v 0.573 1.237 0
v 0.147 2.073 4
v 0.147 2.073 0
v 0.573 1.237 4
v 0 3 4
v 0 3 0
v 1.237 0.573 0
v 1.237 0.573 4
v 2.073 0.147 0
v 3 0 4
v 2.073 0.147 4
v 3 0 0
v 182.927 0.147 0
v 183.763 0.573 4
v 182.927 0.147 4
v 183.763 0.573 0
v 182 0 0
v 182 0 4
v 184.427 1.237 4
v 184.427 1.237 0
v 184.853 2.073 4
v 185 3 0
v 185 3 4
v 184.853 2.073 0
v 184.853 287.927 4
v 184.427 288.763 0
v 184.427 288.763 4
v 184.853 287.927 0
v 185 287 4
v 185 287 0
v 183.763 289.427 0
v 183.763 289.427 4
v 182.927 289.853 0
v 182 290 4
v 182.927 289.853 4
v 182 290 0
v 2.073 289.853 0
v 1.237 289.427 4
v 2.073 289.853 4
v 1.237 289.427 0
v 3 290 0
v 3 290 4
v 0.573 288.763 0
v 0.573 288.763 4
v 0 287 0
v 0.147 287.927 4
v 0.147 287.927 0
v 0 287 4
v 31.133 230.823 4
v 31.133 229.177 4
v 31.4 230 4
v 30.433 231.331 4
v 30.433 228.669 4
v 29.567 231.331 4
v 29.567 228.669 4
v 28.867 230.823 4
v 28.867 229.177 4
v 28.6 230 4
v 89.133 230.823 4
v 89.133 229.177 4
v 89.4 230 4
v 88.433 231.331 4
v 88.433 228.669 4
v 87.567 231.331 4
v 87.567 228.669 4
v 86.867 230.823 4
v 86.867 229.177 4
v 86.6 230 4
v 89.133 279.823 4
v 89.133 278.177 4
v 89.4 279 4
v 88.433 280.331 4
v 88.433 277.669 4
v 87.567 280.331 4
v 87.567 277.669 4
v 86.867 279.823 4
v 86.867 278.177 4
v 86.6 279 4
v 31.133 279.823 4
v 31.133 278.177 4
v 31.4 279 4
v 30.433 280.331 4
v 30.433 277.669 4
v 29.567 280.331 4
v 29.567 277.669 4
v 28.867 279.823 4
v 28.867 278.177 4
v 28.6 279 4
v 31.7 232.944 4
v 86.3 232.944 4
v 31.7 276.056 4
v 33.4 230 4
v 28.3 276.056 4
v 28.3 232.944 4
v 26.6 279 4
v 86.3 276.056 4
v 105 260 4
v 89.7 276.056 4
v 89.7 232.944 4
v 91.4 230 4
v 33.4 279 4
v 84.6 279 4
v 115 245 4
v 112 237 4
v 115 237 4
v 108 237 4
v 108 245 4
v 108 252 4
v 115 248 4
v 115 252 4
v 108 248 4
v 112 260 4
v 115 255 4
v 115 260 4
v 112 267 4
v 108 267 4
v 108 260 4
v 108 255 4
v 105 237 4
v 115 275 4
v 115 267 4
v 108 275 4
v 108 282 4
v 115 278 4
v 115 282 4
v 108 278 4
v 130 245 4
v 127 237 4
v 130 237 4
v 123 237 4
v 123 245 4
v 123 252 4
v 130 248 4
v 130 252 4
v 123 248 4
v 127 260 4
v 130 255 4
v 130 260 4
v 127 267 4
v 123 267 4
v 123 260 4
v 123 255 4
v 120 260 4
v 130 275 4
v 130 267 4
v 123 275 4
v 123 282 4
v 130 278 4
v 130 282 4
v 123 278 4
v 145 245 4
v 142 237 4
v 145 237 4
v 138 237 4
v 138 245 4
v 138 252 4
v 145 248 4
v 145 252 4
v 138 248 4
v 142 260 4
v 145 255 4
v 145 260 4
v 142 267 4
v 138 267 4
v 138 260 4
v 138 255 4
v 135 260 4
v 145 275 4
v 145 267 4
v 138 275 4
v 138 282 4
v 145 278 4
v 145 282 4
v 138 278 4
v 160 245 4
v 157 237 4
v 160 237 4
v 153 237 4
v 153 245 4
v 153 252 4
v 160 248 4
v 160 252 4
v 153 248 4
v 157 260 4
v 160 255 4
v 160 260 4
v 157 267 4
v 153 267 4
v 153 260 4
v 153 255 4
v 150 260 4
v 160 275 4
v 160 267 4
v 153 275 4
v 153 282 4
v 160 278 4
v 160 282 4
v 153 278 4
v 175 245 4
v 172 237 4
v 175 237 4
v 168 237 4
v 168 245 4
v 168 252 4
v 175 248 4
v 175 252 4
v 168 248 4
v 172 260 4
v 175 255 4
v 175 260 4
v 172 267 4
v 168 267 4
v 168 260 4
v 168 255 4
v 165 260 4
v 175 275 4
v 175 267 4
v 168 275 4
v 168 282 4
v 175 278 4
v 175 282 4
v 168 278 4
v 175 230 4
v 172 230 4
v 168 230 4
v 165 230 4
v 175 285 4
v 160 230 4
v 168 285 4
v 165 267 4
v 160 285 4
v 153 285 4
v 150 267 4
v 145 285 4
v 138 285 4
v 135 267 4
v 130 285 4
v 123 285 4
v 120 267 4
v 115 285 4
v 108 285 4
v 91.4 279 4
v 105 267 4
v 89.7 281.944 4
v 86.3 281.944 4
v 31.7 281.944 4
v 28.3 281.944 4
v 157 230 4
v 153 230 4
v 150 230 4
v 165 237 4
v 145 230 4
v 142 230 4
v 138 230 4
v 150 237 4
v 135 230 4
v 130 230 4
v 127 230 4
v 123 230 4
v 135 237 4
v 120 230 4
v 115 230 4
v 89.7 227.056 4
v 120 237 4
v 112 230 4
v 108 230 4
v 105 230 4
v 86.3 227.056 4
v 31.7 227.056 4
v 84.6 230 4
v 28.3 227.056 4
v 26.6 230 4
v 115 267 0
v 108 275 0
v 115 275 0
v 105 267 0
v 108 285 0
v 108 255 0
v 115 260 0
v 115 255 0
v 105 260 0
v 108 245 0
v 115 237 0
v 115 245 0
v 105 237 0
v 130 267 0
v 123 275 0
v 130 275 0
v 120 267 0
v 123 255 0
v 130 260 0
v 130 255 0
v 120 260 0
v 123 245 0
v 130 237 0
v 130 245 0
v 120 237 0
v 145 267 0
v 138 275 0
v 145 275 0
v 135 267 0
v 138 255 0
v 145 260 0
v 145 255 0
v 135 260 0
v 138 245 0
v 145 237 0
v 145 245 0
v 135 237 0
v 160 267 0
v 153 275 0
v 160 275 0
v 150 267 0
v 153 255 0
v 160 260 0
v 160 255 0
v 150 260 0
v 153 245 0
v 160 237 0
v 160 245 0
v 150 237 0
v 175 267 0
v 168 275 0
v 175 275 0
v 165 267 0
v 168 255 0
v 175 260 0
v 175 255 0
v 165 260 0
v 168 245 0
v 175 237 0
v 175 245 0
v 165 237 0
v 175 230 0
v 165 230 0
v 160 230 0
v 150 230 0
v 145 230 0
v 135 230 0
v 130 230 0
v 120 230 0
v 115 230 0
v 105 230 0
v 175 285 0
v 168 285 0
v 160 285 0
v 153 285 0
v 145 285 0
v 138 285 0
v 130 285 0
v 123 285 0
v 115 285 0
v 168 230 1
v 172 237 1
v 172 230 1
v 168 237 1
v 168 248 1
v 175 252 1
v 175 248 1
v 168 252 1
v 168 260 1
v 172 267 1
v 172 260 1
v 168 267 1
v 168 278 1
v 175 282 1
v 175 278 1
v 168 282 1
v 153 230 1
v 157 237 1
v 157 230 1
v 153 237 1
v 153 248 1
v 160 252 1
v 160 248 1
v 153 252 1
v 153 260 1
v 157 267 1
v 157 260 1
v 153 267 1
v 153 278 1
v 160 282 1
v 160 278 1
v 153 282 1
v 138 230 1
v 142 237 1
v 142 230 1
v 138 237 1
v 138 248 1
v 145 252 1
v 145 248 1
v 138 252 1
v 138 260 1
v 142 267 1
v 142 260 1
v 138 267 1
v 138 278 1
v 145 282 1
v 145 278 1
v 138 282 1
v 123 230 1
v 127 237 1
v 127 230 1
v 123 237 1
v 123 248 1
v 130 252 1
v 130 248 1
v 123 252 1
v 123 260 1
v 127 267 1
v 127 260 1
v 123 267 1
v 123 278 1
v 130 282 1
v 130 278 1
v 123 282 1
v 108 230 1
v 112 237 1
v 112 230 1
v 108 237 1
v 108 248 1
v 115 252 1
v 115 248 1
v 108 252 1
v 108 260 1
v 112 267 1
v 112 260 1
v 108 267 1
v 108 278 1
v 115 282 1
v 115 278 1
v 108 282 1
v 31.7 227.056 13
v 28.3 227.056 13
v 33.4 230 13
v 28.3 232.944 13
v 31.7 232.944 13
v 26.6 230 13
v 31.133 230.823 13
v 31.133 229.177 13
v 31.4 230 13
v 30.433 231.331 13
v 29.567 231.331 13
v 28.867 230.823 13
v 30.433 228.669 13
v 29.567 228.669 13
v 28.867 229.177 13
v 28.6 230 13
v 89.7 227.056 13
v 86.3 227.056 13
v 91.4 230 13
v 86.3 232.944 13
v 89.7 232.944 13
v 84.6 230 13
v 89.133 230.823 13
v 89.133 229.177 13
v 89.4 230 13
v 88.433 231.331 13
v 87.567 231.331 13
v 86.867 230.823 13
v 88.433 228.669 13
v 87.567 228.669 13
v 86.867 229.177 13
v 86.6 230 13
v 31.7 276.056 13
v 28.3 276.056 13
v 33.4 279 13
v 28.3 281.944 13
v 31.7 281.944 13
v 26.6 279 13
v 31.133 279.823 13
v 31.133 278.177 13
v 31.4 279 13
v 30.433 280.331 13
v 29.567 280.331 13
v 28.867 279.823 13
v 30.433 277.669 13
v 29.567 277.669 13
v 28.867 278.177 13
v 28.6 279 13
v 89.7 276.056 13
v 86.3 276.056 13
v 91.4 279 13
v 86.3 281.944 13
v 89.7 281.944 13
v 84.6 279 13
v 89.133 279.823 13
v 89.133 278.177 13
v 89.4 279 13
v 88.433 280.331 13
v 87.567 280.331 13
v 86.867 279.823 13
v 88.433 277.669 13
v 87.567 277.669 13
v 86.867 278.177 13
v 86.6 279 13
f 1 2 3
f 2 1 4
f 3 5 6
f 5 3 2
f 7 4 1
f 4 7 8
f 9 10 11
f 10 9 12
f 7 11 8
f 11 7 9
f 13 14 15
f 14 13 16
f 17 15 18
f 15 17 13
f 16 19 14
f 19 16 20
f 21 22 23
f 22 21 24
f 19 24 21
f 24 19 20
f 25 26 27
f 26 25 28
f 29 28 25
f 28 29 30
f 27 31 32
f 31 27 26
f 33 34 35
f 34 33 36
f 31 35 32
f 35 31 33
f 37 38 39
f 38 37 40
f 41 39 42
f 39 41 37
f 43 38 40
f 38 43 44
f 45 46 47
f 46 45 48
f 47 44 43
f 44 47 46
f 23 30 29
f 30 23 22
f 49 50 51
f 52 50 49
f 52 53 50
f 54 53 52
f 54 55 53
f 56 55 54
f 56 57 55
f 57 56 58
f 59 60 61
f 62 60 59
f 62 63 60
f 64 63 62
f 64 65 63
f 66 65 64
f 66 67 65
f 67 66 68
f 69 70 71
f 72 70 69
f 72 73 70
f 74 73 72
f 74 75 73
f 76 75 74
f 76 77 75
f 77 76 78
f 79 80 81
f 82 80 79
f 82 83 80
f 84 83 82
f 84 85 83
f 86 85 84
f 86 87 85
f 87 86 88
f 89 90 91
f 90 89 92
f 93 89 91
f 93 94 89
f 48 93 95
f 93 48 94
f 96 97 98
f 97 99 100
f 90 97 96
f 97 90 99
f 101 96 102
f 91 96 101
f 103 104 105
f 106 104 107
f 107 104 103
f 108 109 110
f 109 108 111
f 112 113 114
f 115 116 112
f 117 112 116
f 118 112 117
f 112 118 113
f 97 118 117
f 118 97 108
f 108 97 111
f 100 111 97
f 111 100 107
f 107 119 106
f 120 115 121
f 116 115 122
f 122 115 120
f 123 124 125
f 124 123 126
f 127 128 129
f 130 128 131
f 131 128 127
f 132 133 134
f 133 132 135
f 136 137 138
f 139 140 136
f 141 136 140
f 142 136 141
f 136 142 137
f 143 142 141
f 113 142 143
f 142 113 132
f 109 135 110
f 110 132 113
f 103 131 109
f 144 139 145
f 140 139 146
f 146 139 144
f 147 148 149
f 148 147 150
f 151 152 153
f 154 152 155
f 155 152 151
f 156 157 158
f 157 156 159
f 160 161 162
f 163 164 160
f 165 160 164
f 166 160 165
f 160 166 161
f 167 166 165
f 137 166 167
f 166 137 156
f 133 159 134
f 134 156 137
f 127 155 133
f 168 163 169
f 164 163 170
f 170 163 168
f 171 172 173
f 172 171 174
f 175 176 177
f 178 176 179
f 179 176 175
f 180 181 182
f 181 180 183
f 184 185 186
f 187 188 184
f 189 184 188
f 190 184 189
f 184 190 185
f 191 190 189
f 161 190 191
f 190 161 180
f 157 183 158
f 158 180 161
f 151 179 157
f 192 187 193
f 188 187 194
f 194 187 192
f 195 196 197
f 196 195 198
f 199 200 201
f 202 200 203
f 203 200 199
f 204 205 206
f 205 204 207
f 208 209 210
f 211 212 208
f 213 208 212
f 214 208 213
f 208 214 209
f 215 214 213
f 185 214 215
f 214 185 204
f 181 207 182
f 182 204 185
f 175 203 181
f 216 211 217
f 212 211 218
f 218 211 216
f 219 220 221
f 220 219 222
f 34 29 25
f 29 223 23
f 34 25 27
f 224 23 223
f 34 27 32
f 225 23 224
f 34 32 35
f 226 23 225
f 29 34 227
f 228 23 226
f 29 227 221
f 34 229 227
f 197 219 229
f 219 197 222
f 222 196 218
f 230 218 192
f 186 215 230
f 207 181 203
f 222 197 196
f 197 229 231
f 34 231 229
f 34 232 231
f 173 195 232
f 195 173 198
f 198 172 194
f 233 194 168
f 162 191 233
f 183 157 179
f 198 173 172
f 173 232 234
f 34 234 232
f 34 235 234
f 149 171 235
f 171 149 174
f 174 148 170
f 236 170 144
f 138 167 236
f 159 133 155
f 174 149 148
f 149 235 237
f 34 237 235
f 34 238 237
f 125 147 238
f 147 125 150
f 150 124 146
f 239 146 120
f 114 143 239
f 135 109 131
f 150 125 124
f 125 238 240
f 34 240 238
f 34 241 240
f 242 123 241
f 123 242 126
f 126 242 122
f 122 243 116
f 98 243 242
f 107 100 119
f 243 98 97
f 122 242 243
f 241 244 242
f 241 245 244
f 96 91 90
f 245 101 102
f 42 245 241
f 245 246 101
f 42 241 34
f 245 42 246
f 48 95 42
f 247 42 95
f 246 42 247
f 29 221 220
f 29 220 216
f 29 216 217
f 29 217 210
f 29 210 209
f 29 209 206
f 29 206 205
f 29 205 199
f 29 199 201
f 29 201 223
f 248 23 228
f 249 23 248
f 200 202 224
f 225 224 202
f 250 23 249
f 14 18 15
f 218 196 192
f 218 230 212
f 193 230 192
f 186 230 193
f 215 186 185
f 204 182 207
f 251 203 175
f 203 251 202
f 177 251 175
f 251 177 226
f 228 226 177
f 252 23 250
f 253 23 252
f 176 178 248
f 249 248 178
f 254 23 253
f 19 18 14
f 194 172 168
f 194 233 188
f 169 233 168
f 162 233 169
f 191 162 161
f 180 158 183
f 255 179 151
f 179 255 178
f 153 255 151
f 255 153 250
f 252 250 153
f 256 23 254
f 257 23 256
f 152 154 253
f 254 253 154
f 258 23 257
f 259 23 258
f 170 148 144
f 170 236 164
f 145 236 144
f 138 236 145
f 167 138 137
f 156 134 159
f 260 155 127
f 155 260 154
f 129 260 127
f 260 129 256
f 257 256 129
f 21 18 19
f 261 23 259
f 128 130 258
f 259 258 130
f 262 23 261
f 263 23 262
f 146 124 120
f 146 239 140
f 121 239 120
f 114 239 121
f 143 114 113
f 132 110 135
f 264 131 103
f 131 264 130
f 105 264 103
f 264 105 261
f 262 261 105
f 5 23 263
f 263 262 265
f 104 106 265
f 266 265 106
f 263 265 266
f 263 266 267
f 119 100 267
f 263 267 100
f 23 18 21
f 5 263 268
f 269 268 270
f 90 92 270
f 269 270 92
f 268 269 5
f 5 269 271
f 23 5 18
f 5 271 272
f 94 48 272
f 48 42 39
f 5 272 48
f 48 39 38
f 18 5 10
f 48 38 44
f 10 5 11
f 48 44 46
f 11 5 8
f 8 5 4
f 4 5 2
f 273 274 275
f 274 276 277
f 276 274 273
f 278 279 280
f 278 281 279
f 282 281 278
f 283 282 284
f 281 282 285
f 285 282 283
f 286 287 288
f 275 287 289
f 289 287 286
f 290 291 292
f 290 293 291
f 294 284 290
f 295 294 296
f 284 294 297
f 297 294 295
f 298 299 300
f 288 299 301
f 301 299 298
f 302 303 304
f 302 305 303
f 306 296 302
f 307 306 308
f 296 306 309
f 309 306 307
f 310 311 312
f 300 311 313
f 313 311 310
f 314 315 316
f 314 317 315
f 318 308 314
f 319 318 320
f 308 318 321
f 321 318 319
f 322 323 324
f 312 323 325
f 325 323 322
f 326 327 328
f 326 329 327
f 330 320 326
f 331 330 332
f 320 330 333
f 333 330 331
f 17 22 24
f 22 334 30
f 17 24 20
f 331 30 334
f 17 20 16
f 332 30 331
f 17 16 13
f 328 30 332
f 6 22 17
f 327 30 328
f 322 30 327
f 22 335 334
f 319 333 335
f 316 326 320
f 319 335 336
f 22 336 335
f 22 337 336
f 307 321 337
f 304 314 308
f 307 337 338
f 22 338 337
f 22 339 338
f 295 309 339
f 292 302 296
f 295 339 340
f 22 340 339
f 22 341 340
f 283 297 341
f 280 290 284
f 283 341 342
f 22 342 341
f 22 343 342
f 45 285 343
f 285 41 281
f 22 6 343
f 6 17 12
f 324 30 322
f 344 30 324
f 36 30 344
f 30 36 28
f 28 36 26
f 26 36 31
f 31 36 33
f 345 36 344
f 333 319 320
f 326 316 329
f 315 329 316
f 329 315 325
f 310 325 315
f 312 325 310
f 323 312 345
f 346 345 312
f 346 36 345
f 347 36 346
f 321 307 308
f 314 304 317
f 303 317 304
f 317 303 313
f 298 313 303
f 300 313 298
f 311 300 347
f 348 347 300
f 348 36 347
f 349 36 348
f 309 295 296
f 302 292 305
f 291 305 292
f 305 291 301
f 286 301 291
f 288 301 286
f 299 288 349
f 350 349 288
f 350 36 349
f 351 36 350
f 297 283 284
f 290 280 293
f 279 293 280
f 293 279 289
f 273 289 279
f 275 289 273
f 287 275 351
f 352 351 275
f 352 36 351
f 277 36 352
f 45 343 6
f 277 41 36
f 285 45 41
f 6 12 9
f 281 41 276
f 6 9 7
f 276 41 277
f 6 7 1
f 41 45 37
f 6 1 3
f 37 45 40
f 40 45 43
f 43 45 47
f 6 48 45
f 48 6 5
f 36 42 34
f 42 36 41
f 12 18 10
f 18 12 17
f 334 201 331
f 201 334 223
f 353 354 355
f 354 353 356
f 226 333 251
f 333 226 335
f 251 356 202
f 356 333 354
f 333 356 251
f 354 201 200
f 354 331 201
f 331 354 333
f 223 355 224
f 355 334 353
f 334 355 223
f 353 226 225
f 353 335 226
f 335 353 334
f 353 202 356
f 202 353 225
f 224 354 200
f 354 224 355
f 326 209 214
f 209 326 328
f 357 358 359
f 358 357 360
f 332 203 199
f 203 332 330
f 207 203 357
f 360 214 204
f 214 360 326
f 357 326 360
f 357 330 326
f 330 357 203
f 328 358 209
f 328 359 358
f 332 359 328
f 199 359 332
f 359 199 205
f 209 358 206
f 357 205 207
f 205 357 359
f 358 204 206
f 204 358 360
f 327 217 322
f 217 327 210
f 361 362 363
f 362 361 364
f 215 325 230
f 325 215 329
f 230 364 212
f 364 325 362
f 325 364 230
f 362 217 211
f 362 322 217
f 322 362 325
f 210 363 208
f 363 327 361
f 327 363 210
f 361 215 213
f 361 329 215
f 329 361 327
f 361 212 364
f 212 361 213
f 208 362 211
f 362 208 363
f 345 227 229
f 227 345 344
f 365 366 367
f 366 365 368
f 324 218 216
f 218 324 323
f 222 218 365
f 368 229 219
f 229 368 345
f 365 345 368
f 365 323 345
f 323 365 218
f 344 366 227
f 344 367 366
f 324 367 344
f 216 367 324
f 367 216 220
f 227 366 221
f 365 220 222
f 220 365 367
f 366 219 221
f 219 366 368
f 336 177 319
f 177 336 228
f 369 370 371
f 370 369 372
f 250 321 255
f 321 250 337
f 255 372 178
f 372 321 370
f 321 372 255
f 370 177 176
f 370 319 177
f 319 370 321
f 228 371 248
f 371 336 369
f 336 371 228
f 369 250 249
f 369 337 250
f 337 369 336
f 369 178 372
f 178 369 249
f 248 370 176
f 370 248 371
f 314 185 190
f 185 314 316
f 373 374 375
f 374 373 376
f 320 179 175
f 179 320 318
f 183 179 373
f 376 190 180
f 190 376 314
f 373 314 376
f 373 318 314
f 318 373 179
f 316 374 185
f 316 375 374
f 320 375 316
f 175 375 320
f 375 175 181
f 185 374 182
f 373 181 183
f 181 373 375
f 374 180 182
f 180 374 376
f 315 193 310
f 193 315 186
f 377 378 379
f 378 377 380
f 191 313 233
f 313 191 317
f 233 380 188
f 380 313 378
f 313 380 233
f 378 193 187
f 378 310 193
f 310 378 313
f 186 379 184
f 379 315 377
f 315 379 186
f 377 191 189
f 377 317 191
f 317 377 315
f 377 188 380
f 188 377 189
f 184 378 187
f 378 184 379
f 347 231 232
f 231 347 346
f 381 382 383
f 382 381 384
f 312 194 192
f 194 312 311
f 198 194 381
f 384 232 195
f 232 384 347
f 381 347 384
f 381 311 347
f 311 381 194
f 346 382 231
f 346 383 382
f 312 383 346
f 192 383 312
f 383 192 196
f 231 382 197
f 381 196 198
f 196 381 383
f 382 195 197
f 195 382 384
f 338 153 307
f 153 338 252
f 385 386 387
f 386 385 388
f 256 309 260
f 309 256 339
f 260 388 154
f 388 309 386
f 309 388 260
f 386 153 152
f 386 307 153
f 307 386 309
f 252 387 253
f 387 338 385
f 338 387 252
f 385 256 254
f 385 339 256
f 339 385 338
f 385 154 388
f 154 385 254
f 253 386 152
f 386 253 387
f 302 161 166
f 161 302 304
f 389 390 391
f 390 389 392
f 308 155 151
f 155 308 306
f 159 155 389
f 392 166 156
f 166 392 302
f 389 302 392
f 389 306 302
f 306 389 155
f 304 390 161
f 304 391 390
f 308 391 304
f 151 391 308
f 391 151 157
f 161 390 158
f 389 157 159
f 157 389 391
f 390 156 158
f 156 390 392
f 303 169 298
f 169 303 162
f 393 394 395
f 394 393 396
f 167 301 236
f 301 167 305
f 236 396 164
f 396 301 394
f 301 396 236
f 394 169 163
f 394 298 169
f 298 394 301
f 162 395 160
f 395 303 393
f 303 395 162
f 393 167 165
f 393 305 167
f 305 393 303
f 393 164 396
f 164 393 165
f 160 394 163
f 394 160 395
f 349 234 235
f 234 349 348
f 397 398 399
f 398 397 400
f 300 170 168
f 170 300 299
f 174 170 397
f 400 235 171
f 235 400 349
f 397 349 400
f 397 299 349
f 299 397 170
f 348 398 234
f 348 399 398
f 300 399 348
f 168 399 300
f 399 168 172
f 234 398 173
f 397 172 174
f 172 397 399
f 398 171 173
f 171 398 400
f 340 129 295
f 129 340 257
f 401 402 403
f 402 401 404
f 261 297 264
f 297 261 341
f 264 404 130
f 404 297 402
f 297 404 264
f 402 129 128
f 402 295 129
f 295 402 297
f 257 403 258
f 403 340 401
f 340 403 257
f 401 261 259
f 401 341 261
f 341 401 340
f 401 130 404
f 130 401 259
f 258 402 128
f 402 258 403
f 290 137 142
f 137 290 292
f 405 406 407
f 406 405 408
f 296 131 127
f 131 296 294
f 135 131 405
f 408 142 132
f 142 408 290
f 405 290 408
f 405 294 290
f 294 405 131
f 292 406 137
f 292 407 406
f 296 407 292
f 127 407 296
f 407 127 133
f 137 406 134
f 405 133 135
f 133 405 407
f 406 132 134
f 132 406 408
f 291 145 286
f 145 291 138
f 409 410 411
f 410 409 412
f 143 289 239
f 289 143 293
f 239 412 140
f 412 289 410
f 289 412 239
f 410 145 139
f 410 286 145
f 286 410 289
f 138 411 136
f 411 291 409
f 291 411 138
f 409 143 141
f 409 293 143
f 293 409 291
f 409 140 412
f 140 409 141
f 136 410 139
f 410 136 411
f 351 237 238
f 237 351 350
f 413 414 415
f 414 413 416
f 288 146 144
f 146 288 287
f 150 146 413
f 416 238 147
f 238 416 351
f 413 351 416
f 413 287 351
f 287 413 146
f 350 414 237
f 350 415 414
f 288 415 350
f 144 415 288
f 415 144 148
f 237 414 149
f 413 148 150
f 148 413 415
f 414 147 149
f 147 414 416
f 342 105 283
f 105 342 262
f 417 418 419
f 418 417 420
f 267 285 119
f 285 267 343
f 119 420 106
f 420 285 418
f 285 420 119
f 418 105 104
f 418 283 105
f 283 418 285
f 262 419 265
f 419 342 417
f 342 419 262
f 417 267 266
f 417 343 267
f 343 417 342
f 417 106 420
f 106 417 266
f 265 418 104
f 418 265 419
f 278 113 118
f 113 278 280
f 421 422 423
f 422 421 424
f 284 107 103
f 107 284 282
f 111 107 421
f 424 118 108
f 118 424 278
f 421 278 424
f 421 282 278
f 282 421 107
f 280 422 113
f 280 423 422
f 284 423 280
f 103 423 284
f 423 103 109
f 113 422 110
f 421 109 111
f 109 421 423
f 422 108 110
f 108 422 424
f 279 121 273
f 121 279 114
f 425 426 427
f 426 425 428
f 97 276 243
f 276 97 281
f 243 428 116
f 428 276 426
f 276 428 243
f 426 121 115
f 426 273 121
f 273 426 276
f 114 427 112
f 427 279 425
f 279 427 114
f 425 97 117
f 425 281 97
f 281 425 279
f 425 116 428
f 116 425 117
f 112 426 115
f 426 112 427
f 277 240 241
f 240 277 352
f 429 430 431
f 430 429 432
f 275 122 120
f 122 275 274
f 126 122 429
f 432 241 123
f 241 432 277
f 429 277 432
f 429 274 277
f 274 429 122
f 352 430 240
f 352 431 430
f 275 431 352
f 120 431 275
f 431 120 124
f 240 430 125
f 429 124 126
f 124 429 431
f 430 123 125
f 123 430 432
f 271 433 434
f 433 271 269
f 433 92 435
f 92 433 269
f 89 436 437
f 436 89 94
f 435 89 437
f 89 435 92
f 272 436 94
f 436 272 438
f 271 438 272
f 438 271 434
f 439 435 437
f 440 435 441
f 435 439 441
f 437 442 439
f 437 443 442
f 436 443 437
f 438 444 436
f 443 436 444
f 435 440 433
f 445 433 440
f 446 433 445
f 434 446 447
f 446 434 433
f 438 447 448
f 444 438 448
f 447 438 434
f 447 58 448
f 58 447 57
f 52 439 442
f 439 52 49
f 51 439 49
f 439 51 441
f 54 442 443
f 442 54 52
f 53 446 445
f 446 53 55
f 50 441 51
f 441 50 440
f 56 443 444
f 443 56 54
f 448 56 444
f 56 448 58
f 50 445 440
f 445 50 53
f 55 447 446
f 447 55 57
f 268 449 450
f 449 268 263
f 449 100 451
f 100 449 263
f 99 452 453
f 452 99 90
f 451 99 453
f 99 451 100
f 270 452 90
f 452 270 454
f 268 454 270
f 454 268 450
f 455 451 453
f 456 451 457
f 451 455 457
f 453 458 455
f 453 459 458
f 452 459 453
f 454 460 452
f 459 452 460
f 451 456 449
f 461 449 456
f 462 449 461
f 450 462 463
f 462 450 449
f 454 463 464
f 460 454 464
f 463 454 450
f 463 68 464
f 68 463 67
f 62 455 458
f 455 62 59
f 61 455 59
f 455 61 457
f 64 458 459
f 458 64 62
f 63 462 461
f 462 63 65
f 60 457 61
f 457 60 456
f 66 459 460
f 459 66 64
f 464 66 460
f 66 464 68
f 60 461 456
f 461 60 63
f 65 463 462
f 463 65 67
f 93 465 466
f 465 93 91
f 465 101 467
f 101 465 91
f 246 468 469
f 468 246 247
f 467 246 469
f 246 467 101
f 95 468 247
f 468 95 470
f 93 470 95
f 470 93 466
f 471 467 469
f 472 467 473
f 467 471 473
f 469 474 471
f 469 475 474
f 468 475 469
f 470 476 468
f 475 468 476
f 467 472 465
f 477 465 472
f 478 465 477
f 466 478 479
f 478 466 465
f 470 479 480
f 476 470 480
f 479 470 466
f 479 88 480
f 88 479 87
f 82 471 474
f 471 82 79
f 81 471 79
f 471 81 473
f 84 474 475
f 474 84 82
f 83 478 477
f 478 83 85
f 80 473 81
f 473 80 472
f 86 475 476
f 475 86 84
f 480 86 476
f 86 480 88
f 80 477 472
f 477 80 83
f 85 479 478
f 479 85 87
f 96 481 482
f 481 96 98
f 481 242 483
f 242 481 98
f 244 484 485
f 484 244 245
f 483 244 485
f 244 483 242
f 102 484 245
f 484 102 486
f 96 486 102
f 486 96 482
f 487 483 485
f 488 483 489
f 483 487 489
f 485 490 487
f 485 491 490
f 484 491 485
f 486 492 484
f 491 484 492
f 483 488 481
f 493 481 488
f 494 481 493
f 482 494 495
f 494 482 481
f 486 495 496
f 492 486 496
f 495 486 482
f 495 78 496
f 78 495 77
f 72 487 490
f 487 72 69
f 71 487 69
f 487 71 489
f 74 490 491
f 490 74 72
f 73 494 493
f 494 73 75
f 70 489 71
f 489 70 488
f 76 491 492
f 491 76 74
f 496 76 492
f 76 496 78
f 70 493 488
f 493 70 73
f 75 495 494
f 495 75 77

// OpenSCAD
// file: modules/RoundedCube.scad
$fn = 20;

module roundedsquare(x=20, y=20, z=20, radius=3) {
	difference(){
		cube([x,y,z]);
		translate([0,0,0]) rotate([0,0,0]) fillet(radius,z);
		translate([x,0,0]) rotate([0,0,90]) fillet(radius,z);
		translate([x,y,0]) rotate([0,0,180]) fillet(radius,z);
		translate([0,y,0]) rotate([0,0,270]) fillet(radius,z);	
	}
}

module roundedcube(x=20, y=20, z=20, radius=3) {
	difference(){
		cube([x,y,z]);
		// fillet along z axis
		translate([0,0,0]) rotate([0,0,0]) fillet(radius,z);
		translate([x,0,0]) rotate([0,0,90]) fillet(radius,z);
		translate([x,y,0]) rotate([0,0,180]) fillet(radius,z);
		translate([0,y,0]) rotate([0,0,270]) fillet(radius,z);
		// fillet along x axis
		translate([0,0,0]) rotate([90,0,90]) fillet(radius,z);
		translate([0,0,z]) rotate([90,90,90]) fillet(radius,z);
		translate([0,y,z]) rotate([90,180,90]) fillet(radius,z);
		translate([0,y,0]) rotate([90,270,90]) fillet(radius,z);
		// fillet along y axis
		translate([0,0,0]) rotate([-90,270,0]) fillet(radius,z);
		translate([x,0,0]) rotate([-90,180,0]) fillet(radius,z);
		translate([x,0,z]) rotate([-90,90,0]) fillet(radius,z);
		translate([0,0,z]) rotate([-90,0,0]) fillet(radius,z);
	}
}

module fillet(radius = 1, height = 1){
    translate([radius, radius, -1]) rotate([0,0,180])
        difference(){
            cube([radius + 1, radius + 1, height + 2]);
            cylinder(r = radius, h = height + 2);
        }
}

//roundedsquare();
// main file
/*
 * Raspberry Pi mounting plate with space for a power supply board
 *
*/

include <modules/RoundedCube.scad>

plateWidth = 185;
plateHeight = 290;
plateThick = 4;
plateCorner = 3;
piHoleX = 58;      //Distance from 1st hole on X
piHoleY = 49;      //Distance from 1st hole on Y
piHoleStartX = 30;
piHoleStartY = 230;
ZipX = plateWidth -15;
ZipY = 5;
ZipY2 = plateHeight-13;


difference(){
	roundedsquare(x=plateWidth, y=plateHeight, z=plateThick, radius=plateCorner);
	for (i = [0:15:60]) {
		#translate([plateWidth-20-i,plateHeight-60,0]) ziptie();
		#translate([plateWidth-10-i,plateHeight-45,0]) rotate([0,0,90]) ziptie();
		#translate([plateWidth-20-i,plateHeight-30,0]) ziptie();
		#translate([plateWidth-10-i,plateHeight-15,0]) rotate([0,0,90]) ziptie();
	}
	
	//	#translate([plateWidth-20,plateHeight-15,0]) ziptie();
	//	#translate([plateWidth-35,plateHeight-15,0]) ziptie();
	//	#translate([plateWidth-60,plateHeight-15,0]) ziptie();
	//	#translate([plateWidth-80,plateHeight-15,0]) ziptie();
    //#translate([piHoleStartX+piHoleX+40,piHoleStartY,0]) rotate(90,0,0) ziptie();

  //#translate([ZipX,ZipY2,0]) rotate(90,0,0) ziptie();
}

// Standoff bottom left
translate([piHoleStartX, piHoleStartY, plateThick])screwStandoff();
// Standoff bottom right
translate([piHoleStartX + piHoleX, piHoleStartY, plateThick])screwStandoff();
// Standoff top left
translate([piHoleStartX, piHoleStartY + piHoleY, plateThick])screwStandoff();
// Standoff top right
translate([piHoleStartX + piHoleX, piHoleStartY + piHoleY, plateThick])screwStandoff();



module screwHole(){
    screwHole = 4.5;
    screwDepth = 10;
    screwHead = 9;
    headTaper = 2.3;
    screwHeadDepth = 5;
    translate([0,0,-headTaper])cylinder(d1=screwHole, d2=screwHead, h = headTaper, $fn=20);
    translate([0,0,-headTaper-screwDepth])cylinder(d=screwHole, h=screwDepth, $fn=10);
    translate([0,0,-headTaper-screwDepth])cylinder(d=screwHole, h=screwDepth, $fn=10);
    translate([0,0,0]) cylinder(d=screwHead, h=screwHeadDepth, $fn=10);
}

module screwStandoff(){
    holeWidth = 2.8;      //#4 screw = 2.8mm, 
    holeDepth = 9;        //Offset from height
    Height = holeDepth;
    Width = holeWidth + (2*2);
    difference(){
        cylinder(d=Width, h=Height, $fn=6);
        #translate([0,0,Height-holeDepth])cylinder(d=holeWidth, h=holeDepth, $fn=10);
    }
}

module fillet(radius = 1, height = 1){
    translate([radius, radius, -1]) rotate([0,0,180])
        difference(){
            cube([radius + 1, radius + 1, height + 2]);
            #cylinder(r = radius, h = height + 2);
        }
}

module ziptie(){
    zipWidth = 3;
    zipHeight = 7;
    zipSpace = 7;
    zipDepth = 1;
    // Bottom groove
    #translate ([0,0,0]) cube([zipWidth+zipSpace,zipHeight,zipDepth]);
    // Left ziptie slot
    #translate([0,0,0]) cube([zipWidth,zipHeight,plateThick+1]);
    // Right ziptie slot
    #translate([zipSpace,0,0]) cube([zipWidth,zipHeight,plateThick+1]);
    // Bottom
}
